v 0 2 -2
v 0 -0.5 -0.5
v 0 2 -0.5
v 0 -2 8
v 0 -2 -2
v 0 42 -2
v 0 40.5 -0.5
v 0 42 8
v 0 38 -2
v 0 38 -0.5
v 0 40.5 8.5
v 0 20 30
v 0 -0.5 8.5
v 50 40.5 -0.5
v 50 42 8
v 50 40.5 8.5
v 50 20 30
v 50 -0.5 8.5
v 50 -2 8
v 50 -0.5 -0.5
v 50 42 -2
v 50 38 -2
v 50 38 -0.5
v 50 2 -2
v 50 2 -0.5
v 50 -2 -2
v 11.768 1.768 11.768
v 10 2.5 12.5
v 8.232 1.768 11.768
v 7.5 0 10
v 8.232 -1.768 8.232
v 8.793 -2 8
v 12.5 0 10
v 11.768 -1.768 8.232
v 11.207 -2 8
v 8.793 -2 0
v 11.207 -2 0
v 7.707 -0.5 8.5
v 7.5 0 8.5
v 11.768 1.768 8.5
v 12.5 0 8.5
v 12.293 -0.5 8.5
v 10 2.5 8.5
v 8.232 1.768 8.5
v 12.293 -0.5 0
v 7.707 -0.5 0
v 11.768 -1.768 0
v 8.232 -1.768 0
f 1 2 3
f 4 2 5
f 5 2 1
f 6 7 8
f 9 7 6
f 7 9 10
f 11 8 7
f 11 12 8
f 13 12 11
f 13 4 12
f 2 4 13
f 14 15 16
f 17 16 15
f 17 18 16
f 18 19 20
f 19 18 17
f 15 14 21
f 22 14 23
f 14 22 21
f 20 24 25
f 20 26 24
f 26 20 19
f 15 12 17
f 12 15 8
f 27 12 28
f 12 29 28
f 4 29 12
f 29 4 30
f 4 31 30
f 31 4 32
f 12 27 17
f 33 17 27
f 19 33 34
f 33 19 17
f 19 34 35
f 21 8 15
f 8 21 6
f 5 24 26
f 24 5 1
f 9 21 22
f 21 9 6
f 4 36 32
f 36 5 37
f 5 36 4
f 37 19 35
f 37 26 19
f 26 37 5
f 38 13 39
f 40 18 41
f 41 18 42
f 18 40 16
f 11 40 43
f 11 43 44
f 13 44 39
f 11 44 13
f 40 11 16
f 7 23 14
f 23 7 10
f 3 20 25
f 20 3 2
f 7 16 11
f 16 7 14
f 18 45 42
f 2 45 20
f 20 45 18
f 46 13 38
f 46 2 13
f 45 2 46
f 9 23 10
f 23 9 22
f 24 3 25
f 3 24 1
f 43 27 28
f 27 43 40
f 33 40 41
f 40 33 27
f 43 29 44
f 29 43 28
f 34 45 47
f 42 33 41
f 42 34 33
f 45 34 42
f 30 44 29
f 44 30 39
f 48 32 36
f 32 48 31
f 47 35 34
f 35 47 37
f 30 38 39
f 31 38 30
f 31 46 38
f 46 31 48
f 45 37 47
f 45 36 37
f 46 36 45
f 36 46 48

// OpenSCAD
//gelaender
//color("red")translate([-4, 0, 0]) cube([500, 40, 8]);

difference() {
  translate([0, -4/2, -2]) {
    rotate([90, 0, 90]) {
      translate([0, 8+2, 0])
        linear_extrude(height=50) {
          polygon(points=[[0, 0], [40+4, 0], [20+2, 20+2]]);
        }
      linear_extrude(height=50) {
        polygon(points=[[0, 0], [0, 8+2], [40+4, 8+2], [40+4, 0]]);
      }
    }
  }
  translate([-1, -.5, -.5]) cube([500, 41, 9]);
  translate([-1, 2, -4]) cube([500, 36, 8]);
translate([10, 0, 0]) cylinder(d=5, h=50);
}
